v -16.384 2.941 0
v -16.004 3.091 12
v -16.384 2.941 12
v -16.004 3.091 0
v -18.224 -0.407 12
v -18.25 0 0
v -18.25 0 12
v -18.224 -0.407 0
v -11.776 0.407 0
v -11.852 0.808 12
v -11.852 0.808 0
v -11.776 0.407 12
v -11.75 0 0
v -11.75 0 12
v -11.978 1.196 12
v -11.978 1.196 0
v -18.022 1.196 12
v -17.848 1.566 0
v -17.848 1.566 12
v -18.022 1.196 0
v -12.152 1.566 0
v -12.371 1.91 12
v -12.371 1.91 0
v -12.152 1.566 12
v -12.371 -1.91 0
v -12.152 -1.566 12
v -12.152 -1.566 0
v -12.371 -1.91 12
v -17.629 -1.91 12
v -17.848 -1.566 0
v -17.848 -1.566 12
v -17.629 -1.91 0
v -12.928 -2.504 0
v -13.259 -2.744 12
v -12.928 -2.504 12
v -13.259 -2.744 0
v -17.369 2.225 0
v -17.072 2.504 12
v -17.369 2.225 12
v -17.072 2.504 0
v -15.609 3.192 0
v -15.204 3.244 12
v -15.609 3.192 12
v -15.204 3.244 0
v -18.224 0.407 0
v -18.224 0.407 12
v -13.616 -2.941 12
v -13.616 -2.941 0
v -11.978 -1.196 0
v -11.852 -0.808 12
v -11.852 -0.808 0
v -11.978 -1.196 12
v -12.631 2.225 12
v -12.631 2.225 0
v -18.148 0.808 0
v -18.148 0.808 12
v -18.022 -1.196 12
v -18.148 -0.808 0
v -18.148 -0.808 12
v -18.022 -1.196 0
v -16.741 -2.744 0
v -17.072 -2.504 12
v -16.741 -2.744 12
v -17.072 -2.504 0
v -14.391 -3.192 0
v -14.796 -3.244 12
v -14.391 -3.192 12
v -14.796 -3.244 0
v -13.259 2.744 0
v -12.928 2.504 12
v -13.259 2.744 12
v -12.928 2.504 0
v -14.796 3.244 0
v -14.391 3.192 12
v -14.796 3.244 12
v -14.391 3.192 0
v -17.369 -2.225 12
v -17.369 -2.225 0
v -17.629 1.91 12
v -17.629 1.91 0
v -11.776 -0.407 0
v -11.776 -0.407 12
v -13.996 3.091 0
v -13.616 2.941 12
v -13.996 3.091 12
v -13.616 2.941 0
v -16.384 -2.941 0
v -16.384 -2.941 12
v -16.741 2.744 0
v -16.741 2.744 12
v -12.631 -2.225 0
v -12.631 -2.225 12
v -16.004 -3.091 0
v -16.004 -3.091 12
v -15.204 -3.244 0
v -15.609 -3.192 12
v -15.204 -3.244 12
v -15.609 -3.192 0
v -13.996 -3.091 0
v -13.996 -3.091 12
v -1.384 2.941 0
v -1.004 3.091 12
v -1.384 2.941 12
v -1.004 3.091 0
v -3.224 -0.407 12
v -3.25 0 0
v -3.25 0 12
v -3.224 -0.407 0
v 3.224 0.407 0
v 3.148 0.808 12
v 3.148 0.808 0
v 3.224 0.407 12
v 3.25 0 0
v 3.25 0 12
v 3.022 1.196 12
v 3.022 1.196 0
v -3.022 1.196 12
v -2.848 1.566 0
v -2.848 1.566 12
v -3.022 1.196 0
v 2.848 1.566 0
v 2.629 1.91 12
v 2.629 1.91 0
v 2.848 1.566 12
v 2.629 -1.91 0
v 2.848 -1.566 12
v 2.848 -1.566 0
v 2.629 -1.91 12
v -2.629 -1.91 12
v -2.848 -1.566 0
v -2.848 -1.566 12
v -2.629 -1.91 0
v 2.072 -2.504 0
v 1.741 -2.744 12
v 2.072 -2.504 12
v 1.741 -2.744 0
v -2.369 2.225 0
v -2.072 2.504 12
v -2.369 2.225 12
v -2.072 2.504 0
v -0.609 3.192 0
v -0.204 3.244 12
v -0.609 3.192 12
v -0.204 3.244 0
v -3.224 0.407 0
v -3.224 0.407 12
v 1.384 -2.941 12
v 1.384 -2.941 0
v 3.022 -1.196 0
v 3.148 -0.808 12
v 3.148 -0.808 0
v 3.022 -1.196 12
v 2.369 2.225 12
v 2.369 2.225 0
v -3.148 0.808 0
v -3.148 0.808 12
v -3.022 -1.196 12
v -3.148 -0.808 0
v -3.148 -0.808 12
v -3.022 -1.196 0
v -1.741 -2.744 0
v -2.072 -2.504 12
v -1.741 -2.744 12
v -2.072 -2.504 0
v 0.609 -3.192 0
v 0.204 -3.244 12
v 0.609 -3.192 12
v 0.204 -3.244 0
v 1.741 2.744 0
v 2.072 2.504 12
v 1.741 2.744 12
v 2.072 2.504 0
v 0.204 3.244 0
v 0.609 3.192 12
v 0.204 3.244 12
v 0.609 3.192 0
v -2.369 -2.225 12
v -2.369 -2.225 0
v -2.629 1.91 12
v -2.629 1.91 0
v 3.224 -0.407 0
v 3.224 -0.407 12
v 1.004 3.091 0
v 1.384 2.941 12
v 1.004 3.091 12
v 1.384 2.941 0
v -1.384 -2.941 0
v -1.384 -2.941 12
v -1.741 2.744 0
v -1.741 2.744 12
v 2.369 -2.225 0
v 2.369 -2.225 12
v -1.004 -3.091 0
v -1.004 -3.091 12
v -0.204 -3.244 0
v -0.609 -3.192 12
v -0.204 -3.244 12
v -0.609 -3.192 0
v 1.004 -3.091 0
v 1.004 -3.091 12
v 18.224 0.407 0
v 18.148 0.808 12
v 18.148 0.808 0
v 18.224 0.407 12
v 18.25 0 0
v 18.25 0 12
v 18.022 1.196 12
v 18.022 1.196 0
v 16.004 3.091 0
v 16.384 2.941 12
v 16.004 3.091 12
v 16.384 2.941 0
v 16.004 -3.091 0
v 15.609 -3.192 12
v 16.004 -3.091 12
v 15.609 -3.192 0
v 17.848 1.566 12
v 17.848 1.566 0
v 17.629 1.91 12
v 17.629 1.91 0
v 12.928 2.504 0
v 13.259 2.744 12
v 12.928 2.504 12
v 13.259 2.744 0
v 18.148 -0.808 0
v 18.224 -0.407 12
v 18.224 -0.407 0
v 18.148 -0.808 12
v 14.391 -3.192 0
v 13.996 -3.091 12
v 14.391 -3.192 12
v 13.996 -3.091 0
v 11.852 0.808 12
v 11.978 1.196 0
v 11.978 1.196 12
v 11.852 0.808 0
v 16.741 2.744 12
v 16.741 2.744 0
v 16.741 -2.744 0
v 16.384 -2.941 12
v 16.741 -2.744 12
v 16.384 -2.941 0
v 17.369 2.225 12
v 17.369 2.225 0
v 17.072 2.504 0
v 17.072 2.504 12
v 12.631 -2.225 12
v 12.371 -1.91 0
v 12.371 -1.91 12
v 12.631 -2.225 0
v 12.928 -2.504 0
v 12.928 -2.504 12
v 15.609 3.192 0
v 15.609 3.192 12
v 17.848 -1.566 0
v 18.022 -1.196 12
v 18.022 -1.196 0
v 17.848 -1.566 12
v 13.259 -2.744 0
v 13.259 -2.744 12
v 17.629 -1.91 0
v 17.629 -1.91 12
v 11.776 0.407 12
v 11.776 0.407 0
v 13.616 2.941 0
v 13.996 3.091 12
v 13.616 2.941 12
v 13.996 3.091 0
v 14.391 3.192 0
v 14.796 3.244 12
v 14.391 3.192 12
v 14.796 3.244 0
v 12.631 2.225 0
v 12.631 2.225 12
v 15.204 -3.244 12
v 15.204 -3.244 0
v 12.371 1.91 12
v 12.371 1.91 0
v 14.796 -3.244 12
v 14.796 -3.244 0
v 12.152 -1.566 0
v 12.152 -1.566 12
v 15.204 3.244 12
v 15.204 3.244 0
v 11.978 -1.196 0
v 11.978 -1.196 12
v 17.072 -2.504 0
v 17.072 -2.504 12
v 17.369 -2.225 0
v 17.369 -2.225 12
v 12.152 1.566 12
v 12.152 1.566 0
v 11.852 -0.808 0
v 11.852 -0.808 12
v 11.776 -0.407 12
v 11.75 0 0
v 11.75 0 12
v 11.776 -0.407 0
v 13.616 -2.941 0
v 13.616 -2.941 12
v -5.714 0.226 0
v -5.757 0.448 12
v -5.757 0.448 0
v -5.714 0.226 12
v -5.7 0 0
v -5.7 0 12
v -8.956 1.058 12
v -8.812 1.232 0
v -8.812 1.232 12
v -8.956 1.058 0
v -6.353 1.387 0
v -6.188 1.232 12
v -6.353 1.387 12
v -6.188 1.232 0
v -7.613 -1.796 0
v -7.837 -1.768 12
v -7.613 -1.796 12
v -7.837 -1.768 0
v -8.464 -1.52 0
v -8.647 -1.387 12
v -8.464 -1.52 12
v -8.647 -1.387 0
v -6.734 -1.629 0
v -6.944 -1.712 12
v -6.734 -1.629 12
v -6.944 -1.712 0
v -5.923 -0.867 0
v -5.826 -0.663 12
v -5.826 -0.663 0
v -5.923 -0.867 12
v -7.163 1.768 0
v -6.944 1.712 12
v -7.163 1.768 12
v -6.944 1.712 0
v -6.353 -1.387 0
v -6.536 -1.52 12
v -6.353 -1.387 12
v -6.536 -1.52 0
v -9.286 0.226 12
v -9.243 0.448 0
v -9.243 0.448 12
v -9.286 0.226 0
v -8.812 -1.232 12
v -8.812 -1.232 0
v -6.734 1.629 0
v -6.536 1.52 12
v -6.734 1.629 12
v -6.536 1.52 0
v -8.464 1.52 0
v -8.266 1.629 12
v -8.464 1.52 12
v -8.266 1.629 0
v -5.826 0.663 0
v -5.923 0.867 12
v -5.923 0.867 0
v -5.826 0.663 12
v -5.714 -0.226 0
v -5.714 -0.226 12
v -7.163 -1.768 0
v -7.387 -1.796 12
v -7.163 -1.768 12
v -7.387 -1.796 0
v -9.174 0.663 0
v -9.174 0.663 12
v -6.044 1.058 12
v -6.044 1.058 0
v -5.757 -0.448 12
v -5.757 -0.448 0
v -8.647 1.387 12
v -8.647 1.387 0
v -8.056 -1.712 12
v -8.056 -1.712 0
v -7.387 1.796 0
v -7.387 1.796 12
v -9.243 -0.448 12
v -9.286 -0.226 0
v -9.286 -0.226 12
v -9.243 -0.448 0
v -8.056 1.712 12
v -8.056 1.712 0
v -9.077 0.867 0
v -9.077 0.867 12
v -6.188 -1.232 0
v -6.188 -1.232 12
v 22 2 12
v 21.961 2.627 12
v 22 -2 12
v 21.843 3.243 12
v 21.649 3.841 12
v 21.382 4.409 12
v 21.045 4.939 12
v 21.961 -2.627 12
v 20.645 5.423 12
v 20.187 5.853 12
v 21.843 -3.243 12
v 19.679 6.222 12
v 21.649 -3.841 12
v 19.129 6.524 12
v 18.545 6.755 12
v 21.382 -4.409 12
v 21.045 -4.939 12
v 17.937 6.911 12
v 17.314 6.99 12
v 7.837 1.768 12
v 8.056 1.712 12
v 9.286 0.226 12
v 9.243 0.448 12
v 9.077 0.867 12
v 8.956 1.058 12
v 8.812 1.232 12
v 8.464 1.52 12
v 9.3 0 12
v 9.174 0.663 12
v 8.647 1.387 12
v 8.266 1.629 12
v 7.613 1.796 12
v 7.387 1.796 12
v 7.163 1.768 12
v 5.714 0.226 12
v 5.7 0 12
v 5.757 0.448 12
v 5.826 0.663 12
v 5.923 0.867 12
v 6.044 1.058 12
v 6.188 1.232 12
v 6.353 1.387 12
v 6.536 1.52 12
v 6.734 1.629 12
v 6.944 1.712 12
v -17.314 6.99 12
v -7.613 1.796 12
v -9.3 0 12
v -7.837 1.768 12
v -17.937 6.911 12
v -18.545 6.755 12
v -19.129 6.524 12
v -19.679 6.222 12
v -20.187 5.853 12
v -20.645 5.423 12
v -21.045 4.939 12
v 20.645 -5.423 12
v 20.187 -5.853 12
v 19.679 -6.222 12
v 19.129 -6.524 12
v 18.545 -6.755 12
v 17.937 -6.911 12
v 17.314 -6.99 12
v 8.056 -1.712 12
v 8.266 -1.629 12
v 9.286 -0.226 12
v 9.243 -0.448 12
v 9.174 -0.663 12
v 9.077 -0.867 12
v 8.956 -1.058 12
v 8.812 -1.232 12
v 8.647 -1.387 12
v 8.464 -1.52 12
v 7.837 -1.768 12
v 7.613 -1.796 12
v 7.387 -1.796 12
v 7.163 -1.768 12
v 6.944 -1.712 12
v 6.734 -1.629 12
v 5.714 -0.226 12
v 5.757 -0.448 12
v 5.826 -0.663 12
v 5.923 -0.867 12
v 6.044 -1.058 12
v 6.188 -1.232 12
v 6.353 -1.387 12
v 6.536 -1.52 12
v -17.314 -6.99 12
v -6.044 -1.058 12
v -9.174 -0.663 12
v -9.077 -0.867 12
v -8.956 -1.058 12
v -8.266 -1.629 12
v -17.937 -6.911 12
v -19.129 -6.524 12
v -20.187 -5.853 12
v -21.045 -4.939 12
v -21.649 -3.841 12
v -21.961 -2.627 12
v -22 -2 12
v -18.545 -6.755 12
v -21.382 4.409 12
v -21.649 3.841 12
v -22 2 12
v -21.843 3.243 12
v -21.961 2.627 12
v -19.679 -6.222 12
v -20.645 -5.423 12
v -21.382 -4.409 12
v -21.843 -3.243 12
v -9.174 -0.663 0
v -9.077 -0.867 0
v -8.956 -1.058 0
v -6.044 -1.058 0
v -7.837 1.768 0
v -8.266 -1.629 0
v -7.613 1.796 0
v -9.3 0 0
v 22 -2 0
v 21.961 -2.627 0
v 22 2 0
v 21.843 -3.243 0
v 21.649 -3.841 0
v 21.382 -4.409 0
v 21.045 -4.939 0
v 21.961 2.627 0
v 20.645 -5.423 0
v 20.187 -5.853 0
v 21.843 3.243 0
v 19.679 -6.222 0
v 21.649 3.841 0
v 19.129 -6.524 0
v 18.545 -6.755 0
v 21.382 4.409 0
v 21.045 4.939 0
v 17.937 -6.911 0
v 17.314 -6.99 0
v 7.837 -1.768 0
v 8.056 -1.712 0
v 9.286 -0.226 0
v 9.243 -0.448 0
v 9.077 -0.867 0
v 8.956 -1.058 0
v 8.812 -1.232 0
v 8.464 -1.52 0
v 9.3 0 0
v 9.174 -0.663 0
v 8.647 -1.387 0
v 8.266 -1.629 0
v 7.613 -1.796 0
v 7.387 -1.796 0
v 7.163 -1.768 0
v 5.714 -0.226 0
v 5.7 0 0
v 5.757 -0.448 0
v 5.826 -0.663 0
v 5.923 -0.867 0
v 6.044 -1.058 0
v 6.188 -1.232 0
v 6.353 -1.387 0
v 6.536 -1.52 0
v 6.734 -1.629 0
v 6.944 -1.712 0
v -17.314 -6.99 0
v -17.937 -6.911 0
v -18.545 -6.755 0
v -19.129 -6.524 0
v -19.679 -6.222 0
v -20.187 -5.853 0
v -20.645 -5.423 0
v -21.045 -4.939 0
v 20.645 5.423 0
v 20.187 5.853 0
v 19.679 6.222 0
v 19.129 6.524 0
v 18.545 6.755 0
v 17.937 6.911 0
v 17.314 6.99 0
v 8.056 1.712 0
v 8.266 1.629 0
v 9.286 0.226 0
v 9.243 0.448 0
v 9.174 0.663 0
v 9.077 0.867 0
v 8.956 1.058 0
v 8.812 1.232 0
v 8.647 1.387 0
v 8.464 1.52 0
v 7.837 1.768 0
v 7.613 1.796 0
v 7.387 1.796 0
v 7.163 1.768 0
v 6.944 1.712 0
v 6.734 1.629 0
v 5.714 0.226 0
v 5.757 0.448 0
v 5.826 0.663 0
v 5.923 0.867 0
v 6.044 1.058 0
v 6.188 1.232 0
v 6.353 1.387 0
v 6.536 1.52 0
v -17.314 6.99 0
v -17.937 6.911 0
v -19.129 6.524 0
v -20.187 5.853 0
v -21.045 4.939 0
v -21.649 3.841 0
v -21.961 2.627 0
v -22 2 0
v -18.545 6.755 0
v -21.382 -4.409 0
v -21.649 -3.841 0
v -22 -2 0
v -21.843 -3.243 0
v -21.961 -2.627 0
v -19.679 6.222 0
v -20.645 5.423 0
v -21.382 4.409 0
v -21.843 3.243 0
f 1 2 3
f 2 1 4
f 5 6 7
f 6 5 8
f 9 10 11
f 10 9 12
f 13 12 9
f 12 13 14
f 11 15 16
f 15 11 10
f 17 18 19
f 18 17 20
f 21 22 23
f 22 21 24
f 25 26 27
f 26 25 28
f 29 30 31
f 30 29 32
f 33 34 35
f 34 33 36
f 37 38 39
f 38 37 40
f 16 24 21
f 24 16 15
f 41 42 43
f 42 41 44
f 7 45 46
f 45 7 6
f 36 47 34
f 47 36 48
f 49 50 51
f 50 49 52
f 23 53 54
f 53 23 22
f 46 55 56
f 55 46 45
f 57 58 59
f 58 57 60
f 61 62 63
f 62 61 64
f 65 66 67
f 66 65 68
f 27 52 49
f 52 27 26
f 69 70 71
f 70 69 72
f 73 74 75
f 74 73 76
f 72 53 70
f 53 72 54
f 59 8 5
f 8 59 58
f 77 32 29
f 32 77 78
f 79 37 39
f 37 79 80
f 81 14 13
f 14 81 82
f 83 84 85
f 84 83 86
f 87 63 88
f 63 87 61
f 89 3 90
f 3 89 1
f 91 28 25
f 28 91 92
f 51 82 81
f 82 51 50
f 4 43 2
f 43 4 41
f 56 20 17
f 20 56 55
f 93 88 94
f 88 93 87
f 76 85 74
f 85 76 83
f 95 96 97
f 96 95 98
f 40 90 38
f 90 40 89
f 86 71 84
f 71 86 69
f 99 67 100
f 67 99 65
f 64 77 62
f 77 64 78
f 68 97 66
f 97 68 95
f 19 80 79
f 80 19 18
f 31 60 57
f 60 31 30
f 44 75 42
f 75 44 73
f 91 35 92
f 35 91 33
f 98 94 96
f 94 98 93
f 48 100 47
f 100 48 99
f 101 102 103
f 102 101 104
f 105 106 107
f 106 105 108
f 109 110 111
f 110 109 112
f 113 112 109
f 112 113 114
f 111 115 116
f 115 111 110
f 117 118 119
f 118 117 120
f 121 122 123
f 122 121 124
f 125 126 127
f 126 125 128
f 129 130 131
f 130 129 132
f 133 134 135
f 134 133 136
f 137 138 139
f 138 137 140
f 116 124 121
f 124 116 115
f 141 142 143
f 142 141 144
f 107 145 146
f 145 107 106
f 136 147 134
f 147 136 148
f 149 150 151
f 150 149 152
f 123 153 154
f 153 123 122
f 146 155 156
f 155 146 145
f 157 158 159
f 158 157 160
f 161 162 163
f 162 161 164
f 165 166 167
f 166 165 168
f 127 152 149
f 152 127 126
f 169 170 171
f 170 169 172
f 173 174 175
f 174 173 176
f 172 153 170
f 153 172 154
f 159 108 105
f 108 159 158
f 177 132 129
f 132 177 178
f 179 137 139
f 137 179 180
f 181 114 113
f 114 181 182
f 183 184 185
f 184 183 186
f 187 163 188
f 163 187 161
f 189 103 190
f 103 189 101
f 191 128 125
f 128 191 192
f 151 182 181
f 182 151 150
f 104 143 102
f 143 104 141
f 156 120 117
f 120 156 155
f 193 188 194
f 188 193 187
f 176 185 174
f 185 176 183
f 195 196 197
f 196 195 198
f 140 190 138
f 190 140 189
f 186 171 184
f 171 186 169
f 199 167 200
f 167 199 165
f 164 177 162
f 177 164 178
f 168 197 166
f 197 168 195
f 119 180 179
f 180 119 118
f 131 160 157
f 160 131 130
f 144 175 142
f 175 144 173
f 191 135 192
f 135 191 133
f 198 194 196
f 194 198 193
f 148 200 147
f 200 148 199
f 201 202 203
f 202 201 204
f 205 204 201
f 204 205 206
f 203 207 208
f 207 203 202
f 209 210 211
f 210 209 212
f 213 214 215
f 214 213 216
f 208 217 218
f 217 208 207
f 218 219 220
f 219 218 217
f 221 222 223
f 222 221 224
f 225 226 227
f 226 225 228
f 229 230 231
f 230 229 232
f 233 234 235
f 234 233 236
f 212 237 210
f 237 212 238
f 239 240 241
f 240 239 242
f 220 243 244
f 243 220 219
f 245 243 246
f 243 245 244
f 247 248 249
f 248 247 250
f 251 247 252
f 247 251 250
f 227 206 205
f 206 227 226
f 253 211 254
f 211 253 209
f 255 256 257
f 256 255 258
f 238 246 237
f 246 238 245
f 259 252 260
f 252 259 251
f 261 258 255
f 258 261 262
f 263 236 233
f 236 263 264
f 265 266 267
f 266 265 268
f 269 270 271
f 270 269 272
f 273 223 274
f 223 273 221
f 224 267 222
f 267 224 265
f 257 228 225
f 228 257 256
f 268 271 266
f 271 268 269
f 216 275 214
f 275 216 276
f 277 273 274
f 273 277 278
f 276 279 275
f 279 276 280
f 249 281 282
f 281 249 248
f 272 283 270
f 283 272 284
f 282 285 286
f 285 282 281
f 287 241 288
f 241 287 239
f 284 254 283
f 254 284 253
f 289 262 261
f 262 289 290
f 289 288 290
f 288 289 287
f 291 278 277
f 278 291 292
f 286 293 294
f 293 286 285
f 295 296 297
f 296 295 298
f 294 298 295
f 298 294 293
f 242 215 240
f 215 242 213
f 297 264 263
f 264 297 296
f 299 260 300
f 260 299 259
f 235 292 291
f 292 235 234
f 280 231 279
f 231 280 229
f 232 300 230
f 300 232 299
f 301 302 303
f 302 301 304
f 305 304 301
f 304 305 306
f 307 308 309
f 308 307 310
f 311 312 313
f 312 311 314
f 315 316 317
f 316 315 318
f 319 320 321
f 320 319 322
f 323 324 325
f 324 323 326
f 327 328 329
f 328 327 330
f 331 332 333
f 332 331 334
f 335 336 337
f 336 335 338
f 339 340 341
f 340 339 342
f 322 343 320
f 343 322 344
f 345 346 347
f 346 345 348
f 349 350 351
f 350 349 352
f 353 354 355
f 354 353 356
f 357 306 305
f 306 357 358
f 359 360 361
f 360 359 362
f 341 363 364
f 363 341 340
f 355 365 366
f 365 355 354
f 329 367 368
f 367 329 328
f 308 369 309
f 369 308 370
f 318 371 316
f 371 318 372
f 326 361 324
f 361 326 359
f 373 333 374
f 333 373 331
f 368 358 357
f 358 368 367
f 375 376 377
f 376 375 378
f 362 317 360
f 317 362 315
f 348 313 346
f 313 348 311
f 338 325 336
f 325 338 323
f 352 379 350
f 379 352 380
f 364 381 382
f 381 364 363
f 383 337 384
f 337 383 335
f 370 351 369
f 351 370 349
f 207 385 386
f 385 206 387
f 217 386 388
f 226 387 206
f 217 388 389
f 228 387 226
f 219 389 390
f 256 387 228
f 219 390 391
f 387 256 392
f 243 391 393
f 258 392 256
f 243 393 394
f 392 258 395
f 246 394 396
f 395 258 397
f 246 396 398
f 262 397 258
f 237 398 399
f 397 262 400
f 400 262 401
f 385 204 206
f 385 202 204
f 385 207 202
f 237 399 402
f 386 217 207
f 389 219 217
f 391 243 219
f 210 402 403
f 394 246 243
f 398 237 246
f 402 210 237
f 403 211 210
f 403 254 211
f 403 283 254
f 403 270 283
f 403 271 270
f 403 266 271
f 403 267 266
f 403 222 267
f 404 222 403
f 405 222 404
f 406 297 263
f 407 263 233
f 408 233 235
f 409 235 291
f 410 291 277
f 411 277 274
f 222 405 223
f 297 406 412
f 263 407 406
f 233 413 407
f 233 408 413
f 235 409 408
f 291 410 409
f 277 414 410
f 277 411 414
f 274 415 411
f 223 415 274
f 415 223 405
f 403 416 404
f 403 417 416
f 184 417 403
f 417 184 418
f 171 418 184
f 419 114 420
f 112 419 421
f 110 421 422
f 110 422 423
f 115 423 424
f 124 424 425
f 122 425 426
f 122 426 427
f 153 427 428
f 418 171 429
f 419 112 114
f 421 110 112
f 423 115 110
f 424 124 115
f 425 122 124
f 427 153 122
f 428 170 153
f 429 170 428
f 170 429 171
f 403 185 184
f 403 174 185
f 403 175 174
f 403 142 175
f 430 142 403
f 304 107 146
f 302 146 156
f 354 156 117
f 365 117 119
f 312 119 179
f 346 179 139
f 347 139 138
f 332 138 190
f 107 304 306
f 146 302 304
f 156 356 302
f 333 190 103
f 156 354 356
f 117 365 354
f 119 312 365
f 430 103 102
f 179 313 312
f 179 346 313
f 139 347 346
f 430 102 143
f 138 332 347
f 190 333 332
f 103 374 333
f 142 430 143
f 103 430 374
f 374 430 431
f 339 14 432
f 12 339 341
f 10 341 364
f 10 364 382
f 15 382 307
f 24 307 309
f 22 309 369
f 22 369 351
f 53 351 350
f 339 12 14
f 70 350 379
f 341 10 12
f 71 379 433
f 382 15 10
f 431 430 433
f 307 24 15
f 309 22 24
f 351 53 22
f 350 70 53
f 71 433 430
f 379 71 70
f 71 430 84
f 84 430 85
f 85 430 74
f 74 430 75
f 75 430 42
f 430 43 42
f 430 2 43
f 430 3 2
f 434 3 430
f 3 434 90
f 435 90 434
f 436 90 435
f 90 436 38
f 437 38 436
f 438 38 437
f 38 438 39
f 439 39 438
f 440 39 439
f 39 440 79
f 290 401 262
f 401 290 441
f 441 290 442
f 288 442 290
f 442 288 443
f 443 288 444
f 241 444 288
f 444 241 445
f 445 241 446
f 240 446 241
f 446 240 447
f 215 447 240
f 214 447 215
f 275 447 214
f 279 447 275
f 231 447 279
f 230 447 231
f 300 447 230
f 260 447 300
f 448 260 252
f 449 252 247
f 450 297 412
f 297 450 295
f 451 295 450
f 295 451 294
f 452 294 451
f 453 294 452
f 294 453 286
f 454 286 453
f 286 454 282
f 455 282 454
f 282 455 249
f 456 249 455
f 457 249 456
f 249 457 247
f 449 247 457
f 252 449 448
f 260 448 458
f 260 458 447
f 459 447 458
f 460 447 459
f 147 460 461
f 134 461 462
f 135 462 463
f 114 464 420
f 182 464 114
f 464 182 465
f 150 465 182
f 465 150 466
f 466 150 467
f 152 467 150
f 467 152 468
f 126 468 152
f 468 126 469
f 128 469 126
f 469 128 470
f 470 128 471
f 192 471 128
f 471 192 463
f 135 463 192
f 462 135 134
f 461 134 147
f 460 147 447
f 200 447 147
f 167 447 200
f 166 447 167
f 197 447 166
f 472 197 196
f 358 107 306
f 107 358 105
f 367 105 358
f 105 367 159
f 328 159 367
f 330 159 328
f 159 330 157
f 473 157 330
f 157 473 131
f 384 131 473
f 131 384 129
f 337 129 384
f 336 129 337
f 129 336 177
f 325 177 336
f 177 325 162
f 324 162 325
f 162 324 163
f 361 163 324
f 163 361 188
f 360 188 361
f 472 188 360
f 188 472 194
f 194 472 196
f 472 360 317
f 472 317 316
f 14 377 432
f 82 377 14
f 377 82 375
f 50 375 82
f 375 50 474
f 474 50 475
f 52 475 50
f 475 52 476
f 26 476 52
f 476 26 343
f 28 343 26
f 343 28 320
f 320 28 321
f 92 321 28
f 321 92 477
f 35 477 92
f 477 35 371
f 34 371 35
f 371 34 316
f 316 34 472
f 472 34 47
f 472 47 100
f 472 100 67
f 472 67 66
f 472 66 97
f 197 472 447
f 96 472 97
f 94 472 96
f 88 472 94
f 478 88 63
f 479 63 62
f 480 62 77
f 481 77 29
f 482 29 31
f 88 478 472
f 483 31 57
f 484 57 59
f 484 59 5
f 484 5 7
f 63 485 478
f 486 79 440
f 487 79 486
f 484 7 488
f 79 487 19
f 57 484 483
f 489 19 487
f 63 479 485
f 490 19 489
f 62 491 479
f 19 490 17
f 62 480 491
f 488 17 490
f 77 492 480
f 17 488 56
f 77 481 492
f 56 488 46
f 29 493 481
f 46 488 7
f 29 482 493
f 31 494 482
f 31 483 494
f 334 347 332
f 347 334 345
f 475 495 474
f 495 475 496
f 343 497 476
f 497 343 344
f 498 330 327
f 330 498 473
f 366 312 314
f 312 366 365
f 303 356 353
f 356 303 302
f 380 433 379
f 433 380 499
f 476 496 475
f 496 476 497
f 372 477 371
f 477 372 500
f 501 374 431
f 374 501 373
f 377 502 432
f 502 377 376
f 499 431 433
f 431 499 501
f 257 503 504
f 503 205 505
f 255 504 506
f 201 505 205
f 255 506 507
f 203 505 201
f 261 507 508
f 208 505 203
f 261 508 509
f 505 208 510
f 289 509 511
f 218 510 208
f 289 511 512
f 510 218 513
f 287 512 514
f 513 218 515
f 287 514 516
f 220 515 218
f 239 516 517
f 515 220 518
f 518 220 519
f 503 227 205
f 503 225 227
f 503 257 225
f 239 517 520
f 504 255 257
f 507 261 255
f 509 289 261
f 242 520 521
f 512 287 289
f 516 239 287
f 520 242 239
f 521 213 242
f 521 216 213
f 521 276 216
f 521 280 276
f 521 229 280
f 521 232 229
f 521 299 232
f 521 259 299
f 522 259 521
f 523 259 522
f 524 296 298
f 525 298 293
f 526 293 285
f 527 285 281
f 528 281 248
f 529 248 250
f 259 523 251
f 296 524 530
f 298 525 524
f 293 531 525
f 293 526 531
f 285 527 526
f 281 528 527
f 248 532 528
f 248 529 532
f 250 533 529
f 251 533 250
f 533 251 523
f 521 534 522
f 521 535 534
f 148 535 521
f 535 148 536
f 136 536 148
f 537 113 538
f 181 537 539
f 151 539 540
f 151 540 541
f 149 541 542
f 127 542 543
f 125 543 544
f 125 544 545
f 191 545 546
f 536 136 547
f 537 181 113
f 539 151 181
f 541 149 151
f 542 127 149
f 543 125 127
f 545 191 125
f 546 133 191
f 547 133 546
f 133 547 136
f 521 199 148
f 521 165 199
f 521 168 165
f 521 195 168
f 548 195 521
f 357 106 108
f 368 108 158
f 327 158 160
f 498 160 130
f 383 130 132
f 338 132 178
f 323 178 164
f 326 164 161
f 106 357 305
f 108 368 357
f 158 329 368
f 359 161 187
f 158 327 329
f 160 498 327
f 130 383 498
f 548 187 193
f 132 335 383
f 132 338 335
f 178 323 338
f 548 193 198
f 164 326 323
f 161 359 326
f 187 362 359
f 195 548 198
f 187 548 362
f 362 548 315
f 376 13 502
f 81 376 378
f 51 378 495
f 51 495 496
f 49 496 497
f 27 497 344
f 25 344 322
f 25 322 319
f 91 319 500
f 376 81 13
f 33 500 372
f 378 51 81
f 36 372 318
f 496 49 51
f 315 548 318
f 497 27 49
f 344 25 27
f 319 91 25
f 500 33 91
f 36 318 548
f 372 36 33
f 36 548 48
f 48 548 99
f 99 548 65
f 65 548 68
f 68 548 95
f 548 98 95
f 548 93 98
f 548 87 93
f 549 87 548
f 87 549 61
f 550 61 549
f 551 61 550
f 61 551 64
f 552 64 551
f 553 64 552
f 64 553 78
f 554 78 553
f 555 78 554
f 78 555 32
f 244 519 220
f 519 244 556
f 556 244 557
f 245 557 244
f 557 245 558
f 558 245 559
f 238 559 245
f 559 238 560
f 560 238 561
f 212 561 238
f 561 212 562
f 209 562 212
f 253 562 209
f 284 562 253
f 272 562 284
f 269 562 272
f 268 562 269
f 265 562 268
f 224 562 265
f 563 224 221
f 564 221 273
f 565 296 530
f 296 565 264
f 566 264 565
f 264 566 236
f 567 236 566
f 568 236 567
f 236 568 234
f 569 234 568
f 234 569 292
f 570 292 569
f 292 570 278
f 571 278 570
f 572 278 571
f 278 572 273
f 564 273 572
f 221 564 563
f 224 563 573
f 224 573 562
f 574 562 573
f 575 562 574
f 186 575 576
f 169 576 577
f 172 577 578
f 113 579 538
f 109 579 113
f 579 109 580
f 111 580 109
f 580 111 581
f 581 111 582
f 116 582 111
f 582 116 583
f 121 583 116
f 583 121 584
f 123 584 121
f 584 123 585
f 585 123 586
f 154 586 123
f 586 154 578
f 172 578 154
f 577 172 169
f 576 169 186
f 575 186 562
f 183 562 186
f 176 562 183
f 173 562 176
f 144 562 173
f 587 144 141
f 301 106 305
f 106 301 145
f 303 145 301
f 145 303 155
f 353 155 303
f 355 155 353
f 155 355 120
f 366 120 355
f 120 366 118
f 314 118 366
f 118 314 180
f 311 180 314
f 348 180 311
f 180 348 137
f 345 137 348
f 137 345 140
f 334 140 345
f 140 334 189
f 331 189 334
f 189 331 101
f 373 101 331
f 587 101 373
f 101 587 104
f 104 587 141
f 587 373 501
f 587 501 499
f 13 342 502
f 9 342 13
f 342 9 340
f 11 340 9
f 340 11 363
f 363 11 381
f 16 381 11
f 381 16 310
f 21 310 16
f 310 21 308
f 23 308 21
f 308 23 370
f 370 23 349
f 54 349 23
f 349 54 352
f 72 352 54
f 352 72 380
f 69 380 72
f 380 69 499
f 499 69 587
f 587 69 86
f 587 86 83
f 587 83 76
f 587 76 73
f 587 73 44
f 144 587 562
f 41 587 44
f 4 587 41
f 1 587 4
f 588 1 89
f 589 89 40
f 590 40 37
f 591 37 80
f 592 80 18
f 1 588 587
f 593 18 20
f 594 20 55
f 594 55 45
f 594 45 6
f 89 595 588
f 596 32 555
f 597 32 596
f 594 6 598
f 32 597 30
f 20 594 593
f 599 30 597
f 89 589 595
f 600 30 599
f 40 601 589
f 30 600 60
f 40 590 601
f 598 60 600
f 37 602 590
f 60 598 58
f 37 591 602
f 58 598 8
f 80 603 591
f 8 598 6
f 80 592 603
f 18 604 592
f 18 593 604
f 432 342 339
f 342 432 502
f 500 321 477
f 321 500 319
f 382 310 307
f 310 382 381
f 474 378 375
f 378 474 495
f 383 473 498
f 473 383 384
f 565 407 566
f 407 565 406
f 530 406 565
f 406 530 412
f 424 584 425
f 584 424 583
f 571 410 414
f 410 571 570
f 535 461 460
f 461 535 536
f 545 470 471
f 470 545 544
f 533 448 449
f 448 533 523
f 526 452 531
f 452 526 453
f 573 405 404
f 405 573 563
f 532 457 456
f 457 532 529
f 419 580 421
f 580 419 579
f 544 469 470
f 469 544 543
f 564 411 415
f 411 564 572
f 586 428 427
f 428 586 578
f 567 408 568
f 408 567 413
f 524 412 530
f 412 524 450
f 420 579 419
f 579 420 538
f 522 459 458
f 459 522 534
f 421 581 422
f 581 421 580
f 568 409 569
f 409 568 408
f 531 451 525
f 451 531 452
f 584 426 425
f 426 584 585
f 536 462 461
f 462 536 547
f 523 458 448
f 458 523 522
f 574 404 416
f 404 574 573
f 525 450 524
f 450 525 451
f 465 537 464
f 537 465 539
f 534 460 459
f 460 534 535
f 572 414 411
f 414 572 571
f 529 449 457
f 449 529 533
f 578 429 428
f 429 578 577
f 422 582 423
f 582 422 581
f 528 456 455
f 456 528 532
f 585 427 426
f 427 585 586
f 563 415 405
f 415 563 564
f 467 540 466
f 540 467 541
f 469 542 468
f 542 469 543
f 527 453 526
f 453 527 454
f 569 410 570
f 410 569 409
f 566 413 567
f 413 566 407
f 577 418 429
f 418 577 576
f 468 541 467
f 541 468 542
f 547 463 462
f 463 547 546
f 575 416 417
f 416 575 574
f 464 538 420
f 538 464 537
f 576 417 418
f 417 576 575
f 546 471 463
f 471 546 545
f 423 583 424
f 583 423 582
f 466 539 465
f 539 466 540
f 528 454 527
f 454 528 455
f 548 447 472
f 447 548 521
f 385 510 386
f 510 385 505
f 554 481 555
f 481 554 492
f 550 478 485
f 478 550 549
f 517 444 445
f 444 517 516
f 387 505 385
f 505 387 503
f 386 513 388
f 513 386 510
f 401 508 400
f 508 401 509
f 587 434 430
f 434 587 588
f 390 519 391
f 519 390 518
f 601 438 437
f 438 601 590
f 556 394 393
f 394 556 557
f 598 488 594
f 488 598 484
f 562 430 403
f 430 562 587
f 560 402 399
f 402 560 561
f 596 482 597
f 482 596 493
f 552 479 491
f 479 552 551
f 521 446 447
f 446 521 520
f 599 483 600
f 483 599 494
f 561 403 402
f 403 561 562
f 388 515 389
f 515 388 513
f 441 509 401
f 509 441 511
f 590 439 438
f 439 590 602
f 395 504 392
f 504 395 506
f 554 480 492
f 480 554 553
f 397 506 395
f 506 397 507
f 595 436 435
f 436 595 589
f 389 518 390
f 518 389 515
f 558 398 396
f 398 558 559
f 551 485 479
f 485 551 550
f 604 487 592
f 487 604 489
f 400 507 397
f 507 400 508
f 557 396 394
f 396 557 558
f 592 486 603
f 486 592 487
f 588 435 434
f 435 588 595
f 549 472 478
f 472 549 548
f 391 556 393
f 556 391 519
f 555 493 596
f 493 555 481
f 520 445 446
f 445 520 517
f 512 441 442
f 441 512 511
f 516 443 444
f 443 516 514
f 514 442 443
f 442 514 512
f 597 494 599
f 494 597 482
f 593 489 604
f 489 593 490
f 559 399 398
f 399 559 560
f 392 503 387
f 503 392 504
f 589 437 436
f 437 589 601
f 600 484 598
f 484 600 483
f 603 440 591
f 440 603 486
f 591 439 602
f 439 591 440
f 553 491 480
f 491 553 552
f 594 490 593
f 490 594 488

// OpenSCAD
$fn = 50;


difference() {
	union() {
		hull() {
			translate(v = [-17.0000000000, 2.0000000000, 0]) {
				cylinder(h = 12, r = 5);
			}
			translate(v = [17.0000000000, 2.0000000000, 0]) {
				cylinder(h = 12, r = 5);
			}
			translate(v = [-17.0000000000, -2.0000000000, 0]) {
				cylinder(h = 12, r = 5);
			}
			translate(v = [17.0000000000, -2.0000000000, 0]) {
				cylinder(h = 12, r = 5);
			}
		}
	}
	union() {
		translate(v = [-15.0000000000, 0.0000000000, -100.0000000000]) {
			cylinder(h = 200, r = 3.2500000000);
		}
		translate(v = [0.0000000000, 0.0000000000, -100.0000000000]) {
			cylinder(h = 200, r = 3.2500000000);
		}
		translate(v = [15.0000000000, 0.0000000000, -100.0000000000]) {
			cylinder(h = 200, r = 3.2500000000);
		}
		translate(v = [-15.0000000000, 0.0000000000, 0]) {
			cylinder(h = 12, r = 1.8000000000);
		}
		translate(v = [-7.5000000000, 0.0000000000, 0]) {
			cylinder(h = 12, r = 1.8000000000);
		}
		cylinder(h = 12, r = 1.8000000000);
		translate(v = [7.5000000000, 0.0000000000, 0]) {
			cylinder(h = 12, r = 1.8000000000);
		}
		translate(v = [15.0000000000, 0.0000000000, 0]) {
			cylinder(h = 12, r = 1.8000000000);
		}
		translate(v = [-15.0000000000, 0.0000000000, 0]) {
			cylinder(h = 12, r = 1.8000000000);
		}
		translate(v = [-7.5000000000, 0.0000000000, 0]) {
			cylinder(h = 12, r = 1.8000000000);
		}
		cylinder(h = 12, r = 1.8000000000);
		translate(v = [7.5000000000, 0.0000000000, 0]) {
			cylinder(h = 12, r = 1.8000000000);
		}
		translate(v = [15.0000000000, 0.0000000000, 0]) {
			cylinder(h = 12, r = 1.8000000000);
		}
		translate(v = [-15.0000000000, 0.0000000000, 0]) {
			cylinder(h = 12, r = 1.8000000000);
		}
		translate(v = [-7.5000000000, 0.0000000000, 0]) {
			cylinder(h = 12, r = 1.8000000000);
		}
		cylinder(h = 12, r = 1.8000000000);
		translate(v = [7.5000000000, 0.0000000000, 0]) {
			cylinder(h = 12, r = 1.8000000000);
		}
		translate(v = [15.0000000000, 0.0000000000, 0]) {
			cylinder(h = 12, r = 1.8000000000);
		}
	}
}
